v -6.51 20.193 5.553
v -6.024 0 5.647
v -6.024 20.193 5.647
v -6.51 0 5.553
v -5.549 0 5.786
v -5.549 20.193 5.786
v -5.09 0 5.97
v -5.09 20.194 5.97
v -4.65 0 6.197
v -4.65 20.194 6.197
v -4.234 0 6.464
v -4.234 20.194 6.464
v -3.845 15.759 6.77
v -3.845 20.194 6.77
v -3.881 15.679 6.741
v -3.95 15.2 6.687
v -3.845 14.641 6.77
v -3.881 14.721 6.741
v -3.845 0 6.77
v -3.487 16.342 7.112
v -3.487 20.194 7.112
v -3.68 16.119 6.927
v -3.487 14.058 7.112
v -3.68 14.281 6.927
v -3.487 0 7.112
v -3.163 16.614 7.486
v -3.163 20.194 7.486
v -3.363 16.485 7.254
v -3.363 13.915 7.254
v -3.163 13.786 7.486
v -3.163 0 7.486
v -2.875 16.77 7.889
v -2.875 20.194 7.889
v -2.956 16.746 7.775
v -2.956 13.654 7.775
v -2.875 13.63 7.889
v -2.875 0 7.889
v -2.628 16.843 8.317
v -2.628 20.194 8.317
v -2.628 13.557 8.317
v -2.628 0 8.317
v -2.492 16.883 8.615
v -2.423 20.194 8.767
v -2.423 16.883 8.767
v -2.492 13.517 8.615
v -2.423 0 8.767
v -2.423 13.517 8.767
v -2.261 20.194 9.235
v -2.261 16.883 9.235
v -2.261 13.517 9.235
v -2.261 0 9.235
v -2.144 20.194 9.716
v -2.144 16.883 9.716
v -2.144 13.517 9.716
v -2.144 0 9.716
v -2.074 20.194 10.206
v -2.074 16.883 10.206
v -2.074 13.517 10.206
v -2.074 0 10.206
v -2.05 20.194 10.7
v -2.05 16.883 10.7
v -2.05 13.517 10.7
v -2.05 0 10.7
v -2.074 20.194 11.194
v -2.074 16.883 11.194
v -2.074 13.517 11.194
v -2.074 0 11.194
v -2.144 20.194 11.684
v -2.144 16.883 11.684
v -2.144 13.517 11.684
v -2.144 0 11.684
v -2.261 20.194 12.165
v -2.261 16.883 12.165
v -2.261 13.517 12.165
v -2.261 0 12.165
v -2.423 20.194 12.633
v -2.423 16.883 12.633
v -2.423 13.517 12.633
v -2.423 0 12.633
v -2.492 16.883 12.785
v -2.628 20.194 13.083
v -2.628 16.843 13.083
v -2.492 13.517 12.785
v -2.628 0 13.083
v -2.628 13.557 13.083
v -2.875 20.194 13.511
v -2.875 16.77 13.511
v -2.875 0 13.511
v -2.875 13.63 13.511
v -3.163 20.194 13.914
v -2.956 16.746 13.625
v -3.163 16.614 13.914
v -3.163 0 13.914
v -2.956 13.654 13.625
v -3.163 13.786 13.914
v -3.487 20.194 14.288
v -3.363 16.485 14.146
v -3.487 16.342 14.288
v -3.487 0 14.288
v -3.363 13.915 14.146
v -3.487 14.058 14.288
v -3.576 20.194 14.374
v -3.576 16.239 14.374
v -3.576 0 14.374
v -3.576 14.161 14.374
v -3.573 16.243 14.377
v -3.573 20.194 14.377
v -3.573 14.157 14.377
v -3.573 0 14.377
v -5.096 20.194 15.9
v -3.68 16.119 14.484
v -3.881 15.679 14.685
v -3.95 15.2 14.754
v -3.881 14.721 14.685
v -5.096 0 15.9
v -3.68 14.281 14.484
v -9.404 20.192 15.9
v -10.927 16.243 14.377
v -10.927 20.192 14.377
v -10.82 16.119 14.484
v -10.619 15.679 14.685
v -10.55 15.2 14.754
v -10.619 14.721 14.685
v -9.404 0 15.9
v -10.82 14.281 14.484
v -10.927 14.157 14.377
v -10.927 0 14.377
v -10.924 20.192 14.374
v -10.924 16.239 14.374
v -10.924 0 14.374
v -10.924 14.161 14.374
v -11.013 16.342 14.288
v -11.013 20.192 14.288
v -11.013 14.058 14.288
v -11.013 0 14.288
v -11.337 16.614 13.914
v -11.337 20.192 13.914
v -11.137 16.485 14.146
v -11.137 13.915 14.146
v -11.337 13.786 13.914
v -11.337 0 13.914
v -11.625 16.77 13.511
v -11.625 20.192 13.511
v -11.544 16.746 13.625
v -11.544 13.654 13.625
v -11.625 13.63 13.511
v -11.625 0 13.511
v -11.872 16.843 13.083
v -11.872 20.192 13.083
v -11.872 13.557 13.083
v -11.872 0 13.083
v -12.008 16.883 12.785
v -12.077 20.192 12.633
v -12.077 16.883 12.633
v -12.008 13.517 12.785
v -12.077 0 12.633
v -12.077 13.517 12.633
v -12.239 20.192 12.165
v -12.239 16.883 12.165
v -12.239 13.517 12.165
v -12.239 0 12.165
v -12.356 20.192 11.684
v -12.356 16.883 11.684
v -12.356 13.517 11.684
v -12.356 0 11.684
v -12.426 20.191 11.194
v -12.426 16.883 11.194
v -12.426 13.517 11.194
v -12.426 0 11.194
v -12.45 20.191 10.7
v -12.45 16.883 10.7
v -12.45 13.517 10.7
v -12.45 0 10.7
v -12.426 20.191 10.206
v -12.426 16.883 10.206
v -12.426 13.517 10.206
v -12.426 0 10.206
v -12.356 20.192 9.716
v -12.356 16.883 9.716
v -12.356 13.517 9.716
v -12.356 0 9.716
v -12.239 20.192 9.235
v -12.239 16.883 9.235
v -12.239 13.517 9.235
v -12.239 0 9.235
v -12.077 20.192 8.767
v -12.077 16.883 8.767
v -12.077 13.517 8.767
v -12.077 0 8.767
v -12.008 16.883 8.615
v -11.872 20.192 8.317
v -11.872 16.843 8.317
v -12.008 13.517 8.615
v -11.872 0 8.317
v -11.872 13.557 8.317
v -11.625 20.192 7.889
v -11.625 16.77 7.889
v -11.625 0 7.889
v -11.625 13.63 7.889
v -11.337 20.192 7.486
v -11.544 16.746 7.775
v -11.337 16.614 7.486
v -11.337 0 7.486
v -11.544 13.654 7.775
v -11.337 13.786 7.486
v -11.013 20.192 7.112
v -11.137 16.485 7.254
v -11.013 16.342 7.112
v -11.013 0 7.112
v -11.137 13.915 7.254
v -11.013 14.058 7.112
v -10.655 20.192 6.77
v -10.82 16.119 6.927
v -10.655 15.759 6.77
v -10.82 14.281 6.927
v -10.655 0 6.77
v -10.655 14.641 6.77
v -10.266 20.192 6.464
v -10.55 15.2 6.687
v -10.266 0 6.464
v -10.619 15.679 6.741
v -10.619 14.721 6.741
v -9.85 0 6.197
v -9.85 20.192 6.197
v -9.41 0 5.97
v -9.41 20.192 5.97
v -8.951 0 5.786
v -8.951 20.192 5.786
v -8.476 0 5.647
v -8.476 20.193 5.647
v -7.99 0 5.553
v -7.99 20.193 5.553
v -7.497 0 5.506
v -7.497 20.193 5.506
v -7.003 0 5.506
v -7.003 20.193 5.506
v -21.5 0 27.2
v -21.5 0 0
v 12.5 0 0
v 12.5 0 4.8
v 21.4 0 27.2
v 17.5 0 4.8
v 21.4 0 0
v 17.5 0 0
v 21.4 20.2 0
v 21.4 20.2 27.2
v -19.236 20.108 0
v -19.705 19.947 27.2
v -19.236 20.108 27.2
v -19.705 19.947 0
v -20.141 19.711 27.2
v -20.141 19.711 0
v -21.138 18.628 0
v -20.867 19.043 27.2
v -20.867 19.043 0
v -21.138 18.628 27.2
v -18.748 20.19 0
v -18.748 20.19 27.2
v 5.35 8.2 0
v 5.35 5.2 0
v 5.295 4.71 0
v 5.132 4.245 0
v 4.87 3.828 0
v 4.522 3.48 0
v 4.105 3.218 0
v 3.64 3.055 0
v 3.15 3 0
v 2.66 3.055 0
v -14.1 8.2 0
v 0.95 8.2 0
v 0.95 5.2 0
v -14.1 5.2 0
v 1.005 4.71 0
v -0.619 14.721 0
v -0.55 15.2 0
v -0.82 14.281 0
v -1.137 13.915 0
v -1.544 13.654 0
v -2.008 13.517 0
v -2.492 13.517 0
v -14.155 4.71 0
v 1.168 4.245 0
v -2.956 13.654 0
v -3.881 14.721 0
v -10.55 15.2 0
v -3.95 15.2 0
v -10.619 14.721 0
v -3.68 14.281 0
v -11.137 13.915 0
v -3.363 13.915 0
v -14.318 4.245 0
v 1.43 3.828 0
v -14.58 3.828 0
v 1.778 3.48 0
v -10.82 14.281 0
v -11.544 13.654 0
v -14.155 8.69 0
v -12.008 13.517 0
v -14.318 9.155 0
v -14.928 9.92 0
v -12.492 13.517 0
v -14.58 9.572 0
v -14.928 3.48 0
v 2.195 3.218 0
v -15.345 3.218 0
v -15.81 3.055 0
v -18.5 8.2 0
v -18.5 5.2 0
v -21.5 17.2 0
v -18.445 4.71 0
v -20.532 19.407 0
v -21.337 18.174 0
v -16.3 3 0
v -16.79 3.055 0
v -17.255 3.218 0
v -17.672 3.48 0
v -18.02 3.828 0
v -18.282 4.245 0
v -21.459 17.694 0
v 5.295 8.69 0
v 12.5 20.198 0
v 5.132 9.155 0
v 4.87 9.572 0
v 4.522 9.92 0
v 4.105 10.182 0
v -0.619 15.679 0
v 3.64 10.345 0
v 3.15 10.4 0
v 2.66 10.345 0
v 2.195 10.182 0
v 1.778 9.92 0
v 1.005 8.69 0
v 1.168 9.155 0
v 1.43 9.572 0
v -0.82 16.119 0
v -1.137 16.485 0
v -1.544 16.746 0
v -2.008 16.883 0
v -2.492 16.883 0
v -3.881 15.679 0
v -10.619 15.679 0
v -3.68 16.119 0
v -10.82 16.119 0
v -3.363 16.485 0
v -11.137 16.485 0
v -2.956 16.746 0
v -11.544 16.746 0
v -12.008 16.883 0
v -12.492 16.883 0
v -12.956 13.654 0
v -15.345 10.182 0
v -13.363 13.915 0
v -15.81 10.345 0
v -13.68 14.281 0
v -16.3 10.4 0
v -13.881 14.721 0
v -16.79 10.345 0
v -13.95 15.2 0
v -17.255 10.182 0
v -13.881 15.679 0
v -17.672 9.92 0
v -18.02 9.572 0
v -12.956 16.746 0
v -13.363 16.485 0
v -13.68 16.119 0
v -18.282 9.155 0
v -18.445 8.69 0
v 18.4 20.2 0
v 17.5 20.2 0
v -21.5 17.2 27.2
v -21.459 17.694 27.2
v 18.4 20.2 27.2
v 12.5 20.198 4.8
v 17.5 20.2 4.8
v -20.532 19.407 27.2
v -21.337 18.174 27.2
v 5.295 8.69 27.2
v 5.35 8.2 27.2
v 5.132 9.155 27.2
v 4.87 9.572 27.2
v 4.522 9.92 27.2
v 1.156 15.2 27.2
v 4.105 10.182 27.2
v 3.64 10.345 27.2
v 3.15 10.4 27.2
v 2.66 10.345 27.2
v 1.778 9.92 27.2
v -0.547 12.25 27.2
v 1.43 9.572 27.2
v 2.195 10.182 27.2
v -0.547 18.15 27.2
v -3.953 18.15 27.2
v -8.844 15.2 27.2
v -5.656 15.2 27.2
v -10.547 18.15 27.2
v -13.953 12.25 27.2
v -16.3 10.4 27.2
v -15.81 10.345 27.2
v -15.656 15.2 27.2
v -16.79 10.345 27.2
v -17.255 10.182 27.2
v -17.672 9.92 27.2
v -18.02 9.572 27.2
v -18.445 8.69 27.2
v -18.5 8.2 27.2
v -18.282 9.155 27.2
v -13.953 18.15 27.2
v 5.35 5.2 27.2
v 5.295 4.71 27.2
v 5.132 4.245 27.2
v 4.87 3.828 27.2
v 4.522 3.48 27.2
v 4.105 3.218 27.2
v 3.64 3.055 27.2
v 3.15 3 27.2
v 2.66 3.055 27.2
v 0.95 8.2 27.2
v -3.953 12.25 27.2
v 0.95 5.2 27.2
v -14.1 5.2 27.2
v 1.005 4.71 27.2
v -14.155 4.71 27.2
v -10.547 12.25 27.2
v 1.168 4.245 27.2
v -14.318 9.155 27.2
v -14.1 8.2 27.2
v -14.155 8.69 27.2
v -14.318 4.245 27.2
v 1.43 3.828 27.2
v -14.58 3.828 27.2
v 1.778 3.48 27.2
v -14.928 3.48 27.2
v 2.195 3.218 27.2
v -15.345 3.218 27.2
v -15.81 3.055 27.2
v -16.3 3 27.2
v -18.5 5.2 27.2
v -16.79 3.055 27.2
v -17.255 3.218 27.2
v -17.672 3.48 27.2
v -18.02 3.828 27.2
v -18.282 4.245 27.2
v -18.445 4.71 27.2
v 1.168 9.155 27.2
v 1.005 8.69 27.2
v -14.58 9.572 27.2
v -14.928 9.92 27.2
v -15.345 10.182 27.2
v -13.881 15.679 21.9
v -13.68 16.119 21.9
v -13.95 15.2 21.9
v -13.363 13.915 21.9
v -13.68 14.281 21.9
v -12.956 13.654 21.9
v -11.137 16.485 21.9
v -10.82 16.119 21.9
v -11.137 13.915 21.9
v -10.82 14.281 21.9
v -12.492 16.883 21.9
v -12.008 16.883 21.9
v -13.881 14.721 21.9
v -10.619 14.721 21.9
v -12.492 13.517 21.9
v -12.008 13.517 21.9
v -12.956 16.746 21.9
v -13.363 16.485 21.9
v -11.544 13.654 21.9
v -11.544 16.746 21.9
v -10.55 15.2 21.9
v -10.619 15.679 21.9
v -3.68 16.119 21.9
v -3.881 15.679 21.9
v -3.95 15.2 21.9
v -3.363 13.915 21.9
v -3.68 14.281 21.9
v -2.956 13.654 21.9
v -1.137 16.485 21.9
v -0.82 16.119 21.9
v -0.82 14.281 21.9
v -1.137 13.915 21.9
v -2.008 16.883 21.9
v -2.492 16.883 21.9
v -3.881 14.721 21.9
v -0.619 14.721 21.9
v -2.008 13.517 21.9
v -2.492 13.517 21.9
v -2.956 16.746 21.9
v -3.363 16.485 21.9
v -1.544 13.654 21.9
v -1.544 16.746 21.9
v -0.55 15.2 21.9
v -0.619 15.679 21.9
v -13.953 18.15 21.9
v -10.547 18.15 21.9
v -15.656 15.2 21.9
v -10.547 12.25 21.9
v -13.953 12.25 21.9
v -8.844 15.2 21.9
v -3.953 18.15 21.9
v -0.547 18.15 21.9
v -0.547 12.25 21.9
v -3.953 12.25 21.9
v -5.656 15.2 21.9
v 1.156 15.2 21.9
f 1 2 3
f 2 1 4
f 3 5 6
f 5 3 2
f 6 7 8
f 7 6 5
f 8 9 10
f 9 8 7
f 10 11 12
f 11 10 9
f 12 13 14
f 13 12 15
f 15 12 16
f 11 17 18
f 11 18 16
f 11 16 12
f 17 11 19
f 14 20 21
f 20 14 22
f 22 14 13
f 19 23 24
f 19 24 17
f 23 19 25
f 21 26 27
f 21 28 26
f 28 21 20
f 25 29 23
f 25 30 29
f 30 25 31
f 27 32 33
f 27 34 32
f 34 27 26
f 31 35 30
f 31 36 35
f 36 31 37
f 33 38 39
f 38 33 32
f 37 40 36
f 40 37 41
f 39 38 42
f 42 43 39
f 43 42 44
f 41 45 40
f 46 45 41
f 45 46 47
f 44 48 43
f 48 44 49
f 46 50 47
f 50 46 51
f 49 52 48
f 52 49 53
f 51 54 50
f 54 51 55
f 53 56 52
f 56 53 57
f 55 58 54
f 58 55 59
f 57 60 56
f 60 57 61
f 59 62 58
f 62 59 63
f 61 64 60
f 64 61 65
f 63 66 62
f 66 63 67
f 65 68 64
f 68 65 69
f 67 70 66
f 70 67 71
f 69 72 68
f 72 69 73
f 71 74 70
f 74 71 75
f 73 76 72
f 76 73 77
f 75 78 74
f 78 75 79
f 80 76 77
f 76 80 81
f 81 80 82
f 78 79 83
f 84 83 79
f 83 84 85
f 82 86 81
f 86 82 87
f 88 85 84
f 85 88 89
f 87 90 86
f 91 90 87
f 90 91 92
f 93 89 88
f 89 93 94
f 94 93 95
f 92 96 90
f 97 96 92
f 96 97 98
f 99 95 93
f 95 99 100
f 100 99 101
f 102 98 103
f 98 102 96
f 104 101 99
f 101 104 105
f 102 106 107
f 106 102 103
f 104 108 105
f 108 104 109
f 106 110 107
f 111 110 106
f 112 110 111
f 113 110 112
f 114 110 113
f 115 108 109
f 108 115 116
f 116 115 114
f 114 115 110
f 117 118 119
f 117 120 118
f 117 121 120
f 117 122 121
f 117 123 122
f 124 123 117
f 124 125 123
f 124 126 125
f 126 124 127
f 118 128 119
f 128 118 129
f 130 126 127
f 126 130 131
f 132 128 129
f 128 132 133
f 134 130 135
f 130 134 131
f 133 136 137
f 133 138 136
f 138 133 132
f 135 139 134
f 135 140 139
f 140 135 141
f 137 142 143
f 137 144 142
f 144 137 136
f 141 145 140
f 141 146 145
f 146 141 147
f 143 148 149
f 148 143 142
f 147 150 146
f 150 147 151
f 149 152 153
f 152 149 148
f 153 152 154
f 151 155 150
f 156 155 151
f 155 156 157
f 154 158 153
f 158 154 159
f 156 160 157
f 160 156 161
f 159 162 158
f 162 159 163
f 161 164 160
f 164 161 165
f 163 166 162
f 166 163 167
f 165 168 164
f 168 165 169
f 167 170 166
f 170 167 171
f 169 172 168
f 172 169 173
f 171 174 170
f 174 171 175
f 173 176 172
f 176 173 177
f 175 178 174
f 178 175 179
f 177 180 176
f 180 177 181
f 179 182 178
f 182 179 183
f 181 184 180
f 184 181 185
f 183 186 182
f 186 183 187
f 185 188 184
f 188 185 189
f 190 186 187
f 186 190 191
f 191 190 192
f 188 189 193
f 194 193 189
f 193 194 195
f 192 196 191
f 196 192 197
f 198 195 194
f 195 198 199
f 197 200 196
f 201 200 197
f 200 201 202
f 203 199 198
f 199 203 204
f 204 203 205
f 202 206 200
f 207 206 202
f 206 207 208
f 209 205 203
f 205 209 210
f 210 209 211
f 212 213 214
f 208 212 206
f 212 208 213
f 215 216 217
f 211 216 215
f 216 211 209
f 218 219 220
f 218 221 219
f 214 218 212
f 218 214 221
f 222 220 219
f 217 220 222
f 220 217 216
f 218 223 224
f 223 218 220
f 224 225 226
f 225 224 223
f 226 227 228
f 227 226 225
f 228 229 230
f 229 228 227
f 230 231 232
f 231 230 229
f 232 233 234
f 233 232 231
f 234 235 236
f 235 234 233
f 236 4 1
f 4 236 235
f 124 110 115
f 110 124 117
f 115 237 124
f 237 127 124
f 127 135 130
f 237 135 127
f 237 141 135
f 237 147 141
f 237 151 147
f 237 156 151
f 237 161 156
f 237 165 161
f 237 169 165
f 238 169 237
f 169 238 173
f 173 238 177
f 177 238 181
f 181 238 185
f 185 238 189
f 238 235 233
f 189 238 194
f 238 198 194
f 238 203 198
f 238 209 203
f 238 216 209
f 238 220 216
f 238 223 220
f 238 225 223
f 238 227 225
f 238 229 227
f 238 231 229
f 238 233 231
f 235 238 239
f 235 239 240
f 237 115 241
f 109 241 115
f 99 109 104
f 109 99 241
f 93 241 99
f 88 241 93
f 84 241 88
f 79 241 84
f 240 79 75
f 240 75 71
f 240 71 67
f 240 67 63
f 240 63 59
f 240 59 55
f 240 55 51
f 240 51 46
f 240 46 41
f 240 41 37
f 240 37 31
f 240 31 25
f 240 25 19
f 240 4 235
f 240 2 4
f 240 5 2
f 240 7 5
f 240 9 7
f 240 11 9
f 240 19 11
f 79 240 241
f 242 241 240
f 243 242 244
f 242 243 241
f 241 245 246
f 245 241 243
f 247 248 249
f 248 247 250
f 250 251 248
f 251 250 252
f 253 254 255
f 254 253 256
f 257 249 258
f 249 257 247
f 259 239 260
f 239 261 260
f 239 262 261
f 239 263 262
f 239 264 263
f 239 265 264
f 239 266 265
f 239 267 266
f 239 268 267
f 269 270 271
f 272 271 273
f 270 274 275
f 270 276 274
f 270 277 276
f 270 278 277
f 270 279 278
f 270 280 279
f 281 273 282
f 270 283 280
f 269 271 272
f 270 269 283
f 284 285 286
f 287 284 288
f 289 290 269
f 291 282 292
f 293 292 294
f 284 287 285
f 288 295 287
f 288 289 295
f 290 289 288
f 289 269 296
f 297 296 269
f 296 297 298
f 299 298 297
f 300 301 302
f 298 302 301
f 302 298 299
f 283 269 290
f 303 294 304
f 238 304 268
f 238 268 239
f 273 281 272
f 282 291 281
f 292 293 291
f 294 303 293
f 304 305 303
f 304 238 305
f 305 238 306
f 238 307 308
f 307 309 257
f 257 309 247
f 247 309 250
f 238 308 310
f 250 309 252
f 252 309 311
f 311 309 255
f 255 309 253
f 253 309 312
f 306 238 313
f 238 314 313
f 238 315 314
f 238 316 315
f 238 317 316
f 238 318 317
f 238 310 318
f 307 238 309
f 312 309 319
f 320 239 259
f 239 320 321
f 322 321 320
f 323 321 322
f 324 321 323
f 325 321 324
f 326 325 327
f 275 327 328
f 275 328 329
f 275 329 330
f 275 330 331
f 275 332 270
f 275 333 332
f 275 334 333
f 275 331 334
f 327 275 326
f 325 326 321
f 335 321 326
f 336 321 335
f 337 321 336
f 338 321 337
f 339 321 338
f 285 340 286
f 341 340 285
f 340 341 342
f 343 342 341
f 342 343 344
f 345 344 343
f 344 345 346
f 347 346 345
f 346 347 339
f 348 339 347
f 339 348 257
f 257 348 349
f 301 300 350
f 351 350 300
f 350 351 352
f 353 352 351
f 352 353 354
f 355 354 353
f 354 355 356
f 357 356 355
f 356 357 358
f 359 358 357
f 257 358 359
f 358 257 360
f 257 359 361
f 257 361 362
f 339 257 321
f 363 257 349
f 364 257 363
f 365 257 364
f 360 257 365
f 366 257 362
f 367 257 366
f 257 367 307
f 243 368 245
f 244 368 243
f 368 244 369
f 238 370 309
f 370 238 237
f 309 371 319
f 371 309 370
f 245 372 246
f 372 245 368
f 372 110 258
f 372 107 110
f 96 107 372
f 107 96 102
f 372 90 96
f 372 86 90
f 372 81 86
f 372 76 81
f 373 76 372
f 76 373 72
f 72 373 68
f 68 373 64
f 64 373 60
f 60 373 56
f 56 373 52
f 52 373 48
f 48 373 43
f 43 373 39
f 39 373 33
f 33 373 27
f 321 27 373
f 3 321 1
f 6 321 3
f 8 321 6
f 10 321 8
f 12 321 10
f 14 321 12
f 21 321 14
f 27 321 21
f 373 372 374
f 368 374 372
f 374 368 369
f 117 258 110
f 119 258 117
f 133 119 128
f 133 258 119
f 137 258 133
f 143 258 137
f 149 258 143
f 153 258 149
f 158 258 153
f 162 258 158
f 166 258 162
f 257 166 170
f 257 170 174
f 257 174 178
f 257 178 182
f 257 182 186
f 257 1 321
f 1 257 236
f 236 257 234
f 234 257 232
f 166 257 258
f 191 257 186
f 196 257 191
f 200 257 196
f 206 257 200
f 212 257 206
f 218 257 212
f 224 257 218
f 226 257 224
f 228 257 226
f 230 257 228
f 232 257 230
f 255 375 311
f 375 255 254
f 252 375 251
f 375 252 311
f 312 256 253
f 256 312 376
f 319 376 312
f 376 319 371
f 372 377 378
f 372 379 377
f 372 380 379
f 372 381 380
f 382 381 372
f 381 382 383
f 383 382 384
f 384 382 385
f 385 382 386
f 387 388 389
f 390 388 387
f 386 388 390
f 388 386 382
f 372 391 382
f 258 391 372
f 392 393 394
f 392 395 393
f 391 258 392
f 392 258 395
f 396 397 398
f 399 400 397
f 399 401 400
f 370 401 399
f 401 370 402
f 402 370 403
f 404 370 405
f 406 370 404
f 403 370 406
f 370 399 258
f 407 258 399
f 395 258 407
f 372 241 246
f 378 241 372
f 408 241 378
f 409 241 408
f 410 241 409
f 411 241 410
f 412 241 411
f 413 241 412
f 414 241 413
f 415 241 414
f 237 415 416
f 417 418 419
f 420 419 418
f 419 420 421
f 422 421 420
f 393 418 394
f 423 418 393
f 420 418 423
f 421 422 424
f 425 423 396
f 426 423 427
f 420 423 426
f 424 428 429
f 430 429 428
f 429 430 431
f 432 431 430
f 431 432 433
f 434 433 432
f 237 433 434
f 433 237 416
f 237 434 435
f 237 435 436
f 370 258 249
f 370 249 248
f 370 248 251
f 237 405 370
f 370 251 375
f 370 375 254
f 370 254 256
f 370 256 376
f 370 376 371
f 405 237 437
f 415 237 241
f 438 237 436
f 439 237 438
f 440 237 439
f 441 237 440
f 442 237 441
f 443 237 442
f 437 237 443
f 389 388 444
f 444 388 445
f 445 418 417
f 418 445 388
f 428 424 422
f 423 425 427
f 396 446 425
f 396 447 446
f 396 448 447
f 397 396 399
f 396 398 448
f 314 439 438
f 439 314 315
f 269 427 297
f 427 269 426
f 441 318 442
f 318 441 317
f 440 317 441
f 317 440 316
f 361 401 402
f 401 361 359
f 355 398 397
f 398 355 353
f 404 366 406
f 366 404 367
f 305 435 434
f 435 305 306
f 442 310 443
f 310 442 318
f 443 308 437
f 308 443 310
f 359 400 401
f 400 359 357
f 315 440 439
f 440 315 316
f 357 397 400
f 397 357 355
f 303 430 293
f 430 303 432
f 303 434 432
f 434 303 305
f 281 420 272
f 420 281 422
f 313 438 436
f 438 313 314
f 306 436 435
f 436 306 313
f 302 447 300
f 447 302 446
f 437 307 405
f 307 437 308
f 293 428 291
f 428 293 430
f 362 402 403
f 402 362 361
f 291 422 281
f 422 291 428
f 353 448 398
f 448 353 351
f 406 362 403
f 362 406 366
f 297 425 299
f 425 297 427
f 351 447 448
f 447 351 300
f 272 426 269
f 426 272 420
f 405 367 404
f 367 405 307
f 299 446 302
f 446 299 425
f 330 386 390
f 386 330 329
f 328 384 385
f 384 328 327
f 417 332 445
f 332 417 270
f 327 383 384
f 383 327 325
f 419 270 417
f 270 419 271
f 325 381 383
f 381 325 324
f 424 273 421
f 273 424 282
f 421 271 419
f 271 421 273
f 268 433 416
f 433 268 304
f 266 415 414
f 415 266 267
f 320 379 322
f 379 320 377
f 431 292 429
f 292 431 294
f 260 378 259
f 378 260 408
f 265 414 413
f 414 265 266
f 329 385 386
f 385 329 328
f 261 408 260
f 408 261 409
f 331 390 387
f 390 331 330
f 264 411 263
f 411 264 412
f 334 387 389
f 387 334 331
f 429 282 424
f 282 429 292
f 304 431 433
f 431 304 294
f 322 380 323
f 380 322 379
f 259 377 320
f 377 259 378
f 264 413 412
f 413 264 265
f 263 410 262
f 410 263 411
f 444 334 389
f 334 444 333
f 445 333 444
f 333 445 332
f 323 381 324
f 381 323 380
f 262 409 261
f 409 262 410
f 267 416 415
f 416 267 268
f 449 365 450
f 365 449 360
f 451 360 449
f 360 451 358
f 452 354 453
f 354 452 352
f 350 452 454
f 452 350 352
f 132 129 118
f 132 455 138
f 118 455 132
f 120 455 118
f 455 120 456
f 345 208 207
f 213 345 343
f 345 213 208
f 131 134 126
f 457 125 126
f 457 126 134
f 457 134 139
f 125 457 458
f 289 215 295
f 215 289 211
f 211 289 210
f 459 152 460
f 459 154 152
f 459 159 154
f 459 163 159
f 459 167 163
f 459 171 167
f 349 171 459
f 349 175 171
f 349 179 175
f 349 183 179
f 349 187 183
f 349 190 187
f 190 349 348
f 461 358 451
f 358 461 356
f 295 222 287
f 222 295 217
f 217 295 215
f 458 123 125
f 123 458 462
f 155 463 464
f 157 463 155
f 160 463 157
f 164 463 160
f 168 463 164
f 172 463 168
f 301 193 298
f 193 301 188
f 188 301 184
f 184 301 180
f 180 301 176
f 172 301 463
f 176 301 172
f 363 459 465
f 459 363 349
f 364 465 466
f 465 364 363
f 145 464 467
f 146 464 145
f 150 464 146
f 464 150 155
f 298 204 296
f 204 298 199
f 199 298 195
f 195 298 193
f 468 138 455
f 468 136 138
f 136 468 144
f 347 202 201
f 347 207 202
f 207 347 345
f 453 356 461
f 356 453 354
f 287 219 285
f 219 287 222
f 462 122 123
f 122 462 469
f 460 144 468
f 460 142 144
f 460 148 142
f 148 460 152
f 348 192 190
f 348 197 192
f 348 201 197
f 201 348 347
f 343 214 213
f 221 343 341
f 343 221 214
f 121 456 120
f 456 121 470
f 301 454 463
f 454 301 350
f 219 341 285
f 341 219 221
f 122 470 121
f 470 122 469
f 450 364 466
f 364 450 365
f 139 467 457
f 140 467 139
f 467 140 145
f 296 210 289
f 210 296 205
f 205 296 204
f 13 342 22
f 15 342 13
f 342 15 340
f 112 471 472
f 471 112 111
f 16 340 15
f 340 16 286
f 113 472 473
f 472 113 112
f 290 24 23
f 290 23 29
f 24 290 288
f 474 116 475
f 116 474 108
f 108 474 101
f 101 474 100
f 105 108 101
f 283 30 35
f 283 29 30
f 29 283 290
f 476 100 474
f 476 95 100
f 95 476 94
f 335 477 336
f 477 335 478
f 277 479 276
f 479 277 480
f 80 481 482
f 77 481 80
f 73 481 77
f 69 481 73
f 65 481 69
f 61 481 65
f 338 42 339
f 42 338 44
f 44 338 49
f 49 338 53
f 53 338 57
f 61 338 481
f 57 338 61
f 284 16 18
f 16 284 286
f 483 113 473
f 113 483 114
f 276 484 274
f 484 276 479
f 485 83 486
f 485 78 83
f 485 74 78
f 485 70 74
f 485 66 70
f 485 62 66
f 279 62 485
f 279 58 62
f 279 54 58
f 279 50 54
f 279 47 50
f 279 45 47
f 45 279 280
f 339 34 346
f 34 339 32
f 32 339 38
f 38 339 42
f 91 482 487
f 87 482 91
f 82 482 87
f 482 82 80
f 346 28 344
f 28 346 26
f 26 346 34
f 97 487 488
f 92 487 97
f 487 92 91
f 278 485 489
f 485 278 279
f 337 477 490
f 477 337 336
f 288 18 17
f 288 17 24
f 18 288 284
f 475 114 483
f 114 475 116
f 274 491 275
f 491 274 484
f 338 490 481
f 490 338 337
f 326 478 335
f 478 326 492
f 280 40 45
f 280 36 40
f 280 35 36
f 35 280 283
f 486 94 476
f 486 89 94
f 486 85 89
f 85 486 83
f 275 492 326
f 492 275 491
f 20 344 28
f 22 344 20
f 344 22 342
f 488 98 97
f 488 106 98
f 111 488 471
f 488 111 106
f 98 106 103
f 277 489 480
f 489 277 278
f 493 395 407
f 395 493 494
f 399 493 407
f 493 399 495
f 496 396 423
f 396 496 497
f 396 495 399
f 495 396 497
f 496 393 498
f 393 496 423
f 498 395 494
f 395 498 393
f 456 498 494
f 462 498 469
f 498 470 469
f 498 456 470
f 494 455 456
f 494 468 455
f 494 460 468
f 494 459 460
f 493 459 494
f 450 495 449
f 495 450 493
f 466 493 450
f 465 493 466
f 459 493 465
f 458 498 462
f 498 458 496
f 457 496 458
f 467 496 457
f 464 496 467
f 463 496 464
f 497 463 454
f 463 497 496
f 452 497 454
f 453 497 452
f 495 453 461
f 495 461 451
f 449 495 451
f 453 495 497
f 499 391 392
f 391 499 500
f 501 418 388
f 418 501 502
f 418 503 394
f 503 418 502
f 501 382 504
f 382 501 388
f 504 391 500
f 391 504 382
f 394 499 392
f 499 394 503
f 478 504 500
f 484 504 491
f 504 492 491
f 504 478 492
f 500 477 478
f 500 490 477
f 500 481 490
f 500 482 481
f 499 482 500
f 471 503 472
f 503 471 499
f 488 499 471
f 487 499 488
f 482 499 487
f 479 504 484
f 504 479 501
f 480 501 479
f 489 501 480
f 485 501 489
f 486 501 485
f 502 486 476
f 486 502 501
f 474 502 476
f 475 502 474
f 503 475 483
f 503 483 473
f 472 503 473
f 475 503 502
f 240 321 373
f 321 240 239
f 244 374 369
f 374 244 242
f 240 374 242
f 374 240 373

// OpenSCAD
// file: functions.scad
/*******************************************************************

This OpenSCAD code and its rendered 3D model are part of the

	Kühling&Kühling RepRap Industrial 3D Printer


All details, BOM, assembling instructions and latest sources:
	http://kuehlingkuehling.de

Designed and developed by:
	Jonas Kühling <mail@jonaskuehling.de>
	Simon Kühling <mail@simonkuehling.de>

Licensed under:
	Creative Commons Attribution-ShareAlike
	CC BY-SA 3.0
	http://creativecommons.org/licenses/by-sa/3.0/

*******************************************************************/

module teardrop (r=4.5,h=20,alpha=45,teardropcorner=0,fulldrop=0){		// tear drop hole for top-centering
											// use teardropcorner=1 for bottom horizontal corners
	render()
	translate([-h/2,0,0])
		rotate([-270,0+(teardropcorner*180),90])
			difference(){
				linear_extrude(height=h){
					circle(r);
					polygon(points=[[0,0],[r*cos(alpha),r*sin(alpha)],[0,r/sin(alpha)],[-r*cos(alpha),r*sin(alpha)]], paths=[[0,1,2,3]]);
				}
				if(fulldrop==0) 
					translate([0,(r/sin(alpha))/2+r,h/2]) cube([2*r+2,r/sin(alpha),h+2],center=true);
			}
}

//teardrop(4.5,22,fulldrop=true);



module teardropcentering (r=4.5,h=20,alpha=45){				// tear drop hole for top-centering
	centering_offset_factor = 1.1;
	render()
	translate([-h/2,0,0])
		rotate([-270,0,90])
			difference(){
				linear_extrude(height=h){
					circle(r, $fn=24);
					polygon(points=[[0,0],[r*cos(alpha),r*sin(alpha)],[0,r/sin(alpha)],[-r*cos(alpha),r*sin(alpha)]], paths=[[0,1,2,3]]);
				}
				translate([0,(r/sin(alpha))/2+r*centering_offset_factor,h/2]) cube([2*r+2,r/sin(alpha),h+2],center=true);
			}
}

//teardropcentering();



module teardropcentering_half (r=4.5,h=20, bottom=0,alpha=45){				// tear drop hole for top-centering
																// upper half (bottom=0) or bottom half (bottom=1)
	centering_offset_factor = 1.2;
	render()
	translate([-h/2,0,0])
		rotate([-270,0,90])
			difference(){
				linear_extrude(height=h){
					circle(r, $fn=24);
					polygon(points=[[0,0],[r*cos(alpha),r*sin(alpha)],[0,r/sin(alpha)],[-r*cos(alpha),r*sin(alpha)]], paths=[[0,1,2,3]]);
				}
				translate([0,(r/sin(alpha))/2+r*centering_offset_factor,h/2]) cube([2*r+2,r/sin(alpha),h+2],center=true);
				translate([0,-(r*centering_offset_factor)/2-0.5+bottom*(r*centering_offset_factor+1),h/2]) cube([2*r+2,r*centering_offset_factor+1,h+2],center=true);
			}
}

//teardropcentering_half(bottom=0);


module polyhole(d,h){
	n = max(round(2 * d),3);
	cylinder(h = h, r = (d / 2) / cos (180 / n), $fn = n, center=true);
}



module roundcorner(radius,edge_length){
	render()
	translate([0,0,-1])
		difference(){
			translate([-1,-1,0])
				cube(size = [radius+1,radius+1,edge_length+2], center = false);
			translate(v = [radius,radius,-1])
				cylinder(h = edge_length+4, r=radius, center=false,$fs=0.1);
		}
}

//roundcorner(5,5);



module roundcorner_tear(radius,edge_length){
	render()
	difference(){
		translate([-1,-1,-1])
			cube(size = [edge_length+2, radius+1, radius+1], center = false);
		translate([(edge_length+4)/2-2, radius, radius])
			teardrop(radius, edge_length+4,teardropcorner=1);
	}
}

//roundcorner_tear(8,20);


module roundedge_tear(radius){
	render()
	difference(){
		translate([-1,-1,-1])
			cube(size = [radius+1, radius+1, radius+1], center = false);
		translate([radius,radius,radius])
			union(){
				sphere(r=radius, $fs=0.1);
				translate([0,0,-radius])
					cylinder(r1=(radius*sin(45))-(radius-(radius*sin(45))),r2=radius*sin(45),h=(radius-(radius*sin(45))), $fs=0.1);
			}
	}
}

//roundedge_tear(20);



module roundedge(radius){
	render()
	difference(){
		translate([-1,-1,-1])
			cube(size = [radius+1, radius+1, radius+1], center = false);
		translate([radius,radius,radius])
			sphere(r=radius, $fs=0.1);
	}
}

//roundedge(5);


module nut_trap(nut_wrench_size,trap_height,vertical=0, clearance=0.2,center=true){		// M3 wrench size = 5.5
	radius = cornerdiameter(nut_wrench_size+2*clearance) /2;
	rotate([0,vertical*90,0])
		cylinder(h = trap_height, r = radius, center=center, $fn = 6);
}

//nut_trap(5,5,0);

module nut_slot(nut_wrench_size,nut_height, nut_elevation,vertical=0, clearance=0.2){		// M3 wrench size = 5.5
	radius = cornerdiameter(nut_wrench_size+2*clearance) /2;
	slot_height = nut_height+2*clearance;
	slot_width = nut_wrench_size+2*clearance;
	rotate([0,vertical*270,0]){
		cylinder(h = slot_height, r = radius, center=true, $fn = 6);
		translate([0,-slot_width/2,-slot_height/2]) cube([nut_elevation+1,slot_width,slot_height]);
	}
}

//nut_slot(5.5,3,4,1);

function cornerdiameter(wrench_size) =  2* ((wrench_size)/2)/ cos(180/6);
function cornerdiameter_8(wrench_size) =  2* ((wrench_size)/2)/ cos(180/8);
// main file
/*******************************************************************

This OpenSCAD code and its rendered 3D model are part of the

	Kühling&Kühling RepRap Industrial 3D Printer


All details, BOM, assembling instructions and latest sources:
	http://kuehlingkuehling.de

Designed and developed by:
	Jonas Kühling <mail@jonaskuehling.de>
	Simon Kühling <mail@simonkuehling.de>

Licensed under:
	Creative Commons Attribution-ShareAlike
	CC BY-SA 3.0
	http://creativecommons.org/licenses/by-sa/3.0/

*******************************************************************/

include <configuration.scad>

///// RENDER RIGHT HOTEND ADAPTER /////
//rotate([90,0,0]) translate([0,-clearance-wall,0])		// for printing
//extruder_hotend();

///// RENDER LEFT EXTRUDER /////
rotate([90,0,0]) translate([0,-clearance-wall,0])		// for printing
mirror([1,0,0]) extruder_hotend();




module extruder_hotend(){

	difference(){

		// main body
		translate([0,clearance+wall,-extruder_hotend_body_height])
			hull(){
				translate([-extruder_hotend_body_width/2+clearance/2,0,extruder_hotend_body_height-wall])
					cube([extruder_hotend_body_width-clearance/2,extruder_hotend_body_length-clearance-wall,wall]);
				translate([-extruder_hotend_body_width/2+clearance/2,0,0])
					cube([wall,extruder_hotend_body_length-clearance-wall,wall]);
				translate([extruder_hotend_body_width/2-wall,0,wall])
					rotate([-90,0,0])
						cylinder(r=wall,h=extruder_hotend_body_length-clearance-wall);
			}


		// hotend countersink
		translate([extruder_drivegear_dia/2,extruder_hotend_body_length-extruder_gearbox_drivegear_dist,-(extruder_hotend_body_height+2)/2+1])
			rotate([0,0,90]) rotate([0,90,0])
				teardrop(extruder_hotend_insulator_dia/2+clearance,extruder_hotend_body_height+2);

		// mount and adjustment screw holes
		hull(){
			translate([extruder_hotend_body_width/2-wall-clearance-extruder_mount_screw_dia/2,-1,-wall-clearance-extruder_mount_screw_dia/2])
				rotate([-90,0,0])
					cylinder(r=extruder_mount_screw_dia/2+clearance,h=extruder_hotend_body_length+2);
			translate([extruder_hotend_body_width/2-wall-clearance-extruder_mount_screw_dia/2,-1,-wall-clearance-extruder_mount_screw_dia/2-extruder_hotend_adapter_adjustment_range])
				rotate([-90,0,0])
					cylinder(r=extruder_mount_screw_dia/2+clearance,h=extruder_hotend_body_length+2);
		}
		hull(){
			translate([extruder_drivegear_dia/2-extruder_hotend_insulator_dia/2-clearance-wall-clearance-extruder_mount_screw_dia/2,-1,-wall-clearance-extruder_mount_screw_dia/2])
				rotate([-90,0,0])
					cylinder(r=extruder_mount_screw_dia/2+clearance,h=extruder_hotend_body_length+2);
			translate([extruder_drivegear_dia/2-extruder_hotend_insulator_dia/2-clearance-wall-clearance-extruder_mount_screw_dia/2,-1,-wall-clearance-extruder_mount_screw_dia/2-extruder_hotend_adapter_adjustment_range])
				rotate([-90,0,0])
					cylinder(r=extruder_mount_screw_dia/2+clearance,h=extruder_hotend_body_length+2);
		}

		// hotend insulator mount screw holes and nut traps
		translate([extruder_drivegear_dia/2+extruder_hotend_insulator_dia/2,-1,-extruder_hotend_body_height+extruder_hotend_insulator_countersink-extruder_hotend_insulator_groove_pos])
			rotate([-90,0,0])
				cylinder(r=extruder_hotend_mount_screw_dia/2+clearance,h=extruder_hotend_body_length+2);
		translate([extruder_drivegear_dia/2-extruder_hotend_insulator_dia/2,-1,-extruder_hotend_body_height+extruder_hotend_insulator_countersink-extruder_hotend_insulator_groove_pos])
			rotate([-90,0,0])
				cylinder(r=extruder_hotend_mount_screw_dia/2+clearance,h=extruder_hotend_body_length+2);
		translate([extruder_drivegear_dia/2+extruder_hotend_insulator_dia/2,(extruder_hotend_body_length)/2+extruder_hotend_body_length-extruder_gearbox_drivegear_dist+extruder_hotend_insulator_dia/2+clearance+2*wall,-extruder_hotend_body_height+extruder_hotend_insulator_countersink-extruder_hotend_insulator_groove_pos])
			rotate([90,0,0])
				nut_trap(extruder_hotend_mount_screw_nut_wrench,extruder_hotend_body_length);
		translate([extruder_drivegear_dia/2-extruder_hotend_insulator_dia/2,(extruder_hotend_body_length)/2+extruder_hotend_body_length-extruder_gearbox_drivegear_dist+extruder_hotend_insulator_dia/2+clearance+2*wall,-extruder_hotend_body_height+extruder_hotend_insulator_countersink-extruder_hotend_insulator_groove_pos])
			rotate([90,0,0])
				nut_trap(extruder_hotend_mount_screw_nut_wrench,extruder_hotend_body_length);

		// hotend cable channel
		translate([-extruder_front_body_width/2+extruder_mount_screw_washer_dia/2-wall_thin/2,wall_thin,-extruder_hotend_body_height-1])
			cube([extruder_watercoolingtube_dia,extruder_watercoolingtube_dia-wall_thin+wall,extruder_hotend_body_height+2]);
		translate([-extruder_front_body_width/2+extruder_mount_screw_washer_dia/2,-1,-extruder_hotend_body_height-1])
			cube([extruder_watercoolingtube_dia-wall_thin,wall_thin+2,extruder_hotend_body_height+2]);
/*
		// hotend cable channel
		translate([-extruder_front_body_width/2+extruder_mount_screw_washer_dia/2-wall_thin/2,wall_thin,-extruder_front_body_z_addition_bottom-1])
			cube([extruder_watercoolingtube_dia,extruder_watercoolingtube_dia-wall_thin+wall,extruder_front_body_height+extruder_front_body_z_addition_bottom+2]);
		translate([-extruder_front_body_width/2+extruder_mount_screw_washer_dia/2,-1,-extruder_front_body_z_addition_bottom-1])
			cube([extruder_watercoolingtube_dia-wall_thin,wall_thin+2,extruder_front_body_height+extruder_front_body_z_addition_bottom+2]);
*/

	}

}
